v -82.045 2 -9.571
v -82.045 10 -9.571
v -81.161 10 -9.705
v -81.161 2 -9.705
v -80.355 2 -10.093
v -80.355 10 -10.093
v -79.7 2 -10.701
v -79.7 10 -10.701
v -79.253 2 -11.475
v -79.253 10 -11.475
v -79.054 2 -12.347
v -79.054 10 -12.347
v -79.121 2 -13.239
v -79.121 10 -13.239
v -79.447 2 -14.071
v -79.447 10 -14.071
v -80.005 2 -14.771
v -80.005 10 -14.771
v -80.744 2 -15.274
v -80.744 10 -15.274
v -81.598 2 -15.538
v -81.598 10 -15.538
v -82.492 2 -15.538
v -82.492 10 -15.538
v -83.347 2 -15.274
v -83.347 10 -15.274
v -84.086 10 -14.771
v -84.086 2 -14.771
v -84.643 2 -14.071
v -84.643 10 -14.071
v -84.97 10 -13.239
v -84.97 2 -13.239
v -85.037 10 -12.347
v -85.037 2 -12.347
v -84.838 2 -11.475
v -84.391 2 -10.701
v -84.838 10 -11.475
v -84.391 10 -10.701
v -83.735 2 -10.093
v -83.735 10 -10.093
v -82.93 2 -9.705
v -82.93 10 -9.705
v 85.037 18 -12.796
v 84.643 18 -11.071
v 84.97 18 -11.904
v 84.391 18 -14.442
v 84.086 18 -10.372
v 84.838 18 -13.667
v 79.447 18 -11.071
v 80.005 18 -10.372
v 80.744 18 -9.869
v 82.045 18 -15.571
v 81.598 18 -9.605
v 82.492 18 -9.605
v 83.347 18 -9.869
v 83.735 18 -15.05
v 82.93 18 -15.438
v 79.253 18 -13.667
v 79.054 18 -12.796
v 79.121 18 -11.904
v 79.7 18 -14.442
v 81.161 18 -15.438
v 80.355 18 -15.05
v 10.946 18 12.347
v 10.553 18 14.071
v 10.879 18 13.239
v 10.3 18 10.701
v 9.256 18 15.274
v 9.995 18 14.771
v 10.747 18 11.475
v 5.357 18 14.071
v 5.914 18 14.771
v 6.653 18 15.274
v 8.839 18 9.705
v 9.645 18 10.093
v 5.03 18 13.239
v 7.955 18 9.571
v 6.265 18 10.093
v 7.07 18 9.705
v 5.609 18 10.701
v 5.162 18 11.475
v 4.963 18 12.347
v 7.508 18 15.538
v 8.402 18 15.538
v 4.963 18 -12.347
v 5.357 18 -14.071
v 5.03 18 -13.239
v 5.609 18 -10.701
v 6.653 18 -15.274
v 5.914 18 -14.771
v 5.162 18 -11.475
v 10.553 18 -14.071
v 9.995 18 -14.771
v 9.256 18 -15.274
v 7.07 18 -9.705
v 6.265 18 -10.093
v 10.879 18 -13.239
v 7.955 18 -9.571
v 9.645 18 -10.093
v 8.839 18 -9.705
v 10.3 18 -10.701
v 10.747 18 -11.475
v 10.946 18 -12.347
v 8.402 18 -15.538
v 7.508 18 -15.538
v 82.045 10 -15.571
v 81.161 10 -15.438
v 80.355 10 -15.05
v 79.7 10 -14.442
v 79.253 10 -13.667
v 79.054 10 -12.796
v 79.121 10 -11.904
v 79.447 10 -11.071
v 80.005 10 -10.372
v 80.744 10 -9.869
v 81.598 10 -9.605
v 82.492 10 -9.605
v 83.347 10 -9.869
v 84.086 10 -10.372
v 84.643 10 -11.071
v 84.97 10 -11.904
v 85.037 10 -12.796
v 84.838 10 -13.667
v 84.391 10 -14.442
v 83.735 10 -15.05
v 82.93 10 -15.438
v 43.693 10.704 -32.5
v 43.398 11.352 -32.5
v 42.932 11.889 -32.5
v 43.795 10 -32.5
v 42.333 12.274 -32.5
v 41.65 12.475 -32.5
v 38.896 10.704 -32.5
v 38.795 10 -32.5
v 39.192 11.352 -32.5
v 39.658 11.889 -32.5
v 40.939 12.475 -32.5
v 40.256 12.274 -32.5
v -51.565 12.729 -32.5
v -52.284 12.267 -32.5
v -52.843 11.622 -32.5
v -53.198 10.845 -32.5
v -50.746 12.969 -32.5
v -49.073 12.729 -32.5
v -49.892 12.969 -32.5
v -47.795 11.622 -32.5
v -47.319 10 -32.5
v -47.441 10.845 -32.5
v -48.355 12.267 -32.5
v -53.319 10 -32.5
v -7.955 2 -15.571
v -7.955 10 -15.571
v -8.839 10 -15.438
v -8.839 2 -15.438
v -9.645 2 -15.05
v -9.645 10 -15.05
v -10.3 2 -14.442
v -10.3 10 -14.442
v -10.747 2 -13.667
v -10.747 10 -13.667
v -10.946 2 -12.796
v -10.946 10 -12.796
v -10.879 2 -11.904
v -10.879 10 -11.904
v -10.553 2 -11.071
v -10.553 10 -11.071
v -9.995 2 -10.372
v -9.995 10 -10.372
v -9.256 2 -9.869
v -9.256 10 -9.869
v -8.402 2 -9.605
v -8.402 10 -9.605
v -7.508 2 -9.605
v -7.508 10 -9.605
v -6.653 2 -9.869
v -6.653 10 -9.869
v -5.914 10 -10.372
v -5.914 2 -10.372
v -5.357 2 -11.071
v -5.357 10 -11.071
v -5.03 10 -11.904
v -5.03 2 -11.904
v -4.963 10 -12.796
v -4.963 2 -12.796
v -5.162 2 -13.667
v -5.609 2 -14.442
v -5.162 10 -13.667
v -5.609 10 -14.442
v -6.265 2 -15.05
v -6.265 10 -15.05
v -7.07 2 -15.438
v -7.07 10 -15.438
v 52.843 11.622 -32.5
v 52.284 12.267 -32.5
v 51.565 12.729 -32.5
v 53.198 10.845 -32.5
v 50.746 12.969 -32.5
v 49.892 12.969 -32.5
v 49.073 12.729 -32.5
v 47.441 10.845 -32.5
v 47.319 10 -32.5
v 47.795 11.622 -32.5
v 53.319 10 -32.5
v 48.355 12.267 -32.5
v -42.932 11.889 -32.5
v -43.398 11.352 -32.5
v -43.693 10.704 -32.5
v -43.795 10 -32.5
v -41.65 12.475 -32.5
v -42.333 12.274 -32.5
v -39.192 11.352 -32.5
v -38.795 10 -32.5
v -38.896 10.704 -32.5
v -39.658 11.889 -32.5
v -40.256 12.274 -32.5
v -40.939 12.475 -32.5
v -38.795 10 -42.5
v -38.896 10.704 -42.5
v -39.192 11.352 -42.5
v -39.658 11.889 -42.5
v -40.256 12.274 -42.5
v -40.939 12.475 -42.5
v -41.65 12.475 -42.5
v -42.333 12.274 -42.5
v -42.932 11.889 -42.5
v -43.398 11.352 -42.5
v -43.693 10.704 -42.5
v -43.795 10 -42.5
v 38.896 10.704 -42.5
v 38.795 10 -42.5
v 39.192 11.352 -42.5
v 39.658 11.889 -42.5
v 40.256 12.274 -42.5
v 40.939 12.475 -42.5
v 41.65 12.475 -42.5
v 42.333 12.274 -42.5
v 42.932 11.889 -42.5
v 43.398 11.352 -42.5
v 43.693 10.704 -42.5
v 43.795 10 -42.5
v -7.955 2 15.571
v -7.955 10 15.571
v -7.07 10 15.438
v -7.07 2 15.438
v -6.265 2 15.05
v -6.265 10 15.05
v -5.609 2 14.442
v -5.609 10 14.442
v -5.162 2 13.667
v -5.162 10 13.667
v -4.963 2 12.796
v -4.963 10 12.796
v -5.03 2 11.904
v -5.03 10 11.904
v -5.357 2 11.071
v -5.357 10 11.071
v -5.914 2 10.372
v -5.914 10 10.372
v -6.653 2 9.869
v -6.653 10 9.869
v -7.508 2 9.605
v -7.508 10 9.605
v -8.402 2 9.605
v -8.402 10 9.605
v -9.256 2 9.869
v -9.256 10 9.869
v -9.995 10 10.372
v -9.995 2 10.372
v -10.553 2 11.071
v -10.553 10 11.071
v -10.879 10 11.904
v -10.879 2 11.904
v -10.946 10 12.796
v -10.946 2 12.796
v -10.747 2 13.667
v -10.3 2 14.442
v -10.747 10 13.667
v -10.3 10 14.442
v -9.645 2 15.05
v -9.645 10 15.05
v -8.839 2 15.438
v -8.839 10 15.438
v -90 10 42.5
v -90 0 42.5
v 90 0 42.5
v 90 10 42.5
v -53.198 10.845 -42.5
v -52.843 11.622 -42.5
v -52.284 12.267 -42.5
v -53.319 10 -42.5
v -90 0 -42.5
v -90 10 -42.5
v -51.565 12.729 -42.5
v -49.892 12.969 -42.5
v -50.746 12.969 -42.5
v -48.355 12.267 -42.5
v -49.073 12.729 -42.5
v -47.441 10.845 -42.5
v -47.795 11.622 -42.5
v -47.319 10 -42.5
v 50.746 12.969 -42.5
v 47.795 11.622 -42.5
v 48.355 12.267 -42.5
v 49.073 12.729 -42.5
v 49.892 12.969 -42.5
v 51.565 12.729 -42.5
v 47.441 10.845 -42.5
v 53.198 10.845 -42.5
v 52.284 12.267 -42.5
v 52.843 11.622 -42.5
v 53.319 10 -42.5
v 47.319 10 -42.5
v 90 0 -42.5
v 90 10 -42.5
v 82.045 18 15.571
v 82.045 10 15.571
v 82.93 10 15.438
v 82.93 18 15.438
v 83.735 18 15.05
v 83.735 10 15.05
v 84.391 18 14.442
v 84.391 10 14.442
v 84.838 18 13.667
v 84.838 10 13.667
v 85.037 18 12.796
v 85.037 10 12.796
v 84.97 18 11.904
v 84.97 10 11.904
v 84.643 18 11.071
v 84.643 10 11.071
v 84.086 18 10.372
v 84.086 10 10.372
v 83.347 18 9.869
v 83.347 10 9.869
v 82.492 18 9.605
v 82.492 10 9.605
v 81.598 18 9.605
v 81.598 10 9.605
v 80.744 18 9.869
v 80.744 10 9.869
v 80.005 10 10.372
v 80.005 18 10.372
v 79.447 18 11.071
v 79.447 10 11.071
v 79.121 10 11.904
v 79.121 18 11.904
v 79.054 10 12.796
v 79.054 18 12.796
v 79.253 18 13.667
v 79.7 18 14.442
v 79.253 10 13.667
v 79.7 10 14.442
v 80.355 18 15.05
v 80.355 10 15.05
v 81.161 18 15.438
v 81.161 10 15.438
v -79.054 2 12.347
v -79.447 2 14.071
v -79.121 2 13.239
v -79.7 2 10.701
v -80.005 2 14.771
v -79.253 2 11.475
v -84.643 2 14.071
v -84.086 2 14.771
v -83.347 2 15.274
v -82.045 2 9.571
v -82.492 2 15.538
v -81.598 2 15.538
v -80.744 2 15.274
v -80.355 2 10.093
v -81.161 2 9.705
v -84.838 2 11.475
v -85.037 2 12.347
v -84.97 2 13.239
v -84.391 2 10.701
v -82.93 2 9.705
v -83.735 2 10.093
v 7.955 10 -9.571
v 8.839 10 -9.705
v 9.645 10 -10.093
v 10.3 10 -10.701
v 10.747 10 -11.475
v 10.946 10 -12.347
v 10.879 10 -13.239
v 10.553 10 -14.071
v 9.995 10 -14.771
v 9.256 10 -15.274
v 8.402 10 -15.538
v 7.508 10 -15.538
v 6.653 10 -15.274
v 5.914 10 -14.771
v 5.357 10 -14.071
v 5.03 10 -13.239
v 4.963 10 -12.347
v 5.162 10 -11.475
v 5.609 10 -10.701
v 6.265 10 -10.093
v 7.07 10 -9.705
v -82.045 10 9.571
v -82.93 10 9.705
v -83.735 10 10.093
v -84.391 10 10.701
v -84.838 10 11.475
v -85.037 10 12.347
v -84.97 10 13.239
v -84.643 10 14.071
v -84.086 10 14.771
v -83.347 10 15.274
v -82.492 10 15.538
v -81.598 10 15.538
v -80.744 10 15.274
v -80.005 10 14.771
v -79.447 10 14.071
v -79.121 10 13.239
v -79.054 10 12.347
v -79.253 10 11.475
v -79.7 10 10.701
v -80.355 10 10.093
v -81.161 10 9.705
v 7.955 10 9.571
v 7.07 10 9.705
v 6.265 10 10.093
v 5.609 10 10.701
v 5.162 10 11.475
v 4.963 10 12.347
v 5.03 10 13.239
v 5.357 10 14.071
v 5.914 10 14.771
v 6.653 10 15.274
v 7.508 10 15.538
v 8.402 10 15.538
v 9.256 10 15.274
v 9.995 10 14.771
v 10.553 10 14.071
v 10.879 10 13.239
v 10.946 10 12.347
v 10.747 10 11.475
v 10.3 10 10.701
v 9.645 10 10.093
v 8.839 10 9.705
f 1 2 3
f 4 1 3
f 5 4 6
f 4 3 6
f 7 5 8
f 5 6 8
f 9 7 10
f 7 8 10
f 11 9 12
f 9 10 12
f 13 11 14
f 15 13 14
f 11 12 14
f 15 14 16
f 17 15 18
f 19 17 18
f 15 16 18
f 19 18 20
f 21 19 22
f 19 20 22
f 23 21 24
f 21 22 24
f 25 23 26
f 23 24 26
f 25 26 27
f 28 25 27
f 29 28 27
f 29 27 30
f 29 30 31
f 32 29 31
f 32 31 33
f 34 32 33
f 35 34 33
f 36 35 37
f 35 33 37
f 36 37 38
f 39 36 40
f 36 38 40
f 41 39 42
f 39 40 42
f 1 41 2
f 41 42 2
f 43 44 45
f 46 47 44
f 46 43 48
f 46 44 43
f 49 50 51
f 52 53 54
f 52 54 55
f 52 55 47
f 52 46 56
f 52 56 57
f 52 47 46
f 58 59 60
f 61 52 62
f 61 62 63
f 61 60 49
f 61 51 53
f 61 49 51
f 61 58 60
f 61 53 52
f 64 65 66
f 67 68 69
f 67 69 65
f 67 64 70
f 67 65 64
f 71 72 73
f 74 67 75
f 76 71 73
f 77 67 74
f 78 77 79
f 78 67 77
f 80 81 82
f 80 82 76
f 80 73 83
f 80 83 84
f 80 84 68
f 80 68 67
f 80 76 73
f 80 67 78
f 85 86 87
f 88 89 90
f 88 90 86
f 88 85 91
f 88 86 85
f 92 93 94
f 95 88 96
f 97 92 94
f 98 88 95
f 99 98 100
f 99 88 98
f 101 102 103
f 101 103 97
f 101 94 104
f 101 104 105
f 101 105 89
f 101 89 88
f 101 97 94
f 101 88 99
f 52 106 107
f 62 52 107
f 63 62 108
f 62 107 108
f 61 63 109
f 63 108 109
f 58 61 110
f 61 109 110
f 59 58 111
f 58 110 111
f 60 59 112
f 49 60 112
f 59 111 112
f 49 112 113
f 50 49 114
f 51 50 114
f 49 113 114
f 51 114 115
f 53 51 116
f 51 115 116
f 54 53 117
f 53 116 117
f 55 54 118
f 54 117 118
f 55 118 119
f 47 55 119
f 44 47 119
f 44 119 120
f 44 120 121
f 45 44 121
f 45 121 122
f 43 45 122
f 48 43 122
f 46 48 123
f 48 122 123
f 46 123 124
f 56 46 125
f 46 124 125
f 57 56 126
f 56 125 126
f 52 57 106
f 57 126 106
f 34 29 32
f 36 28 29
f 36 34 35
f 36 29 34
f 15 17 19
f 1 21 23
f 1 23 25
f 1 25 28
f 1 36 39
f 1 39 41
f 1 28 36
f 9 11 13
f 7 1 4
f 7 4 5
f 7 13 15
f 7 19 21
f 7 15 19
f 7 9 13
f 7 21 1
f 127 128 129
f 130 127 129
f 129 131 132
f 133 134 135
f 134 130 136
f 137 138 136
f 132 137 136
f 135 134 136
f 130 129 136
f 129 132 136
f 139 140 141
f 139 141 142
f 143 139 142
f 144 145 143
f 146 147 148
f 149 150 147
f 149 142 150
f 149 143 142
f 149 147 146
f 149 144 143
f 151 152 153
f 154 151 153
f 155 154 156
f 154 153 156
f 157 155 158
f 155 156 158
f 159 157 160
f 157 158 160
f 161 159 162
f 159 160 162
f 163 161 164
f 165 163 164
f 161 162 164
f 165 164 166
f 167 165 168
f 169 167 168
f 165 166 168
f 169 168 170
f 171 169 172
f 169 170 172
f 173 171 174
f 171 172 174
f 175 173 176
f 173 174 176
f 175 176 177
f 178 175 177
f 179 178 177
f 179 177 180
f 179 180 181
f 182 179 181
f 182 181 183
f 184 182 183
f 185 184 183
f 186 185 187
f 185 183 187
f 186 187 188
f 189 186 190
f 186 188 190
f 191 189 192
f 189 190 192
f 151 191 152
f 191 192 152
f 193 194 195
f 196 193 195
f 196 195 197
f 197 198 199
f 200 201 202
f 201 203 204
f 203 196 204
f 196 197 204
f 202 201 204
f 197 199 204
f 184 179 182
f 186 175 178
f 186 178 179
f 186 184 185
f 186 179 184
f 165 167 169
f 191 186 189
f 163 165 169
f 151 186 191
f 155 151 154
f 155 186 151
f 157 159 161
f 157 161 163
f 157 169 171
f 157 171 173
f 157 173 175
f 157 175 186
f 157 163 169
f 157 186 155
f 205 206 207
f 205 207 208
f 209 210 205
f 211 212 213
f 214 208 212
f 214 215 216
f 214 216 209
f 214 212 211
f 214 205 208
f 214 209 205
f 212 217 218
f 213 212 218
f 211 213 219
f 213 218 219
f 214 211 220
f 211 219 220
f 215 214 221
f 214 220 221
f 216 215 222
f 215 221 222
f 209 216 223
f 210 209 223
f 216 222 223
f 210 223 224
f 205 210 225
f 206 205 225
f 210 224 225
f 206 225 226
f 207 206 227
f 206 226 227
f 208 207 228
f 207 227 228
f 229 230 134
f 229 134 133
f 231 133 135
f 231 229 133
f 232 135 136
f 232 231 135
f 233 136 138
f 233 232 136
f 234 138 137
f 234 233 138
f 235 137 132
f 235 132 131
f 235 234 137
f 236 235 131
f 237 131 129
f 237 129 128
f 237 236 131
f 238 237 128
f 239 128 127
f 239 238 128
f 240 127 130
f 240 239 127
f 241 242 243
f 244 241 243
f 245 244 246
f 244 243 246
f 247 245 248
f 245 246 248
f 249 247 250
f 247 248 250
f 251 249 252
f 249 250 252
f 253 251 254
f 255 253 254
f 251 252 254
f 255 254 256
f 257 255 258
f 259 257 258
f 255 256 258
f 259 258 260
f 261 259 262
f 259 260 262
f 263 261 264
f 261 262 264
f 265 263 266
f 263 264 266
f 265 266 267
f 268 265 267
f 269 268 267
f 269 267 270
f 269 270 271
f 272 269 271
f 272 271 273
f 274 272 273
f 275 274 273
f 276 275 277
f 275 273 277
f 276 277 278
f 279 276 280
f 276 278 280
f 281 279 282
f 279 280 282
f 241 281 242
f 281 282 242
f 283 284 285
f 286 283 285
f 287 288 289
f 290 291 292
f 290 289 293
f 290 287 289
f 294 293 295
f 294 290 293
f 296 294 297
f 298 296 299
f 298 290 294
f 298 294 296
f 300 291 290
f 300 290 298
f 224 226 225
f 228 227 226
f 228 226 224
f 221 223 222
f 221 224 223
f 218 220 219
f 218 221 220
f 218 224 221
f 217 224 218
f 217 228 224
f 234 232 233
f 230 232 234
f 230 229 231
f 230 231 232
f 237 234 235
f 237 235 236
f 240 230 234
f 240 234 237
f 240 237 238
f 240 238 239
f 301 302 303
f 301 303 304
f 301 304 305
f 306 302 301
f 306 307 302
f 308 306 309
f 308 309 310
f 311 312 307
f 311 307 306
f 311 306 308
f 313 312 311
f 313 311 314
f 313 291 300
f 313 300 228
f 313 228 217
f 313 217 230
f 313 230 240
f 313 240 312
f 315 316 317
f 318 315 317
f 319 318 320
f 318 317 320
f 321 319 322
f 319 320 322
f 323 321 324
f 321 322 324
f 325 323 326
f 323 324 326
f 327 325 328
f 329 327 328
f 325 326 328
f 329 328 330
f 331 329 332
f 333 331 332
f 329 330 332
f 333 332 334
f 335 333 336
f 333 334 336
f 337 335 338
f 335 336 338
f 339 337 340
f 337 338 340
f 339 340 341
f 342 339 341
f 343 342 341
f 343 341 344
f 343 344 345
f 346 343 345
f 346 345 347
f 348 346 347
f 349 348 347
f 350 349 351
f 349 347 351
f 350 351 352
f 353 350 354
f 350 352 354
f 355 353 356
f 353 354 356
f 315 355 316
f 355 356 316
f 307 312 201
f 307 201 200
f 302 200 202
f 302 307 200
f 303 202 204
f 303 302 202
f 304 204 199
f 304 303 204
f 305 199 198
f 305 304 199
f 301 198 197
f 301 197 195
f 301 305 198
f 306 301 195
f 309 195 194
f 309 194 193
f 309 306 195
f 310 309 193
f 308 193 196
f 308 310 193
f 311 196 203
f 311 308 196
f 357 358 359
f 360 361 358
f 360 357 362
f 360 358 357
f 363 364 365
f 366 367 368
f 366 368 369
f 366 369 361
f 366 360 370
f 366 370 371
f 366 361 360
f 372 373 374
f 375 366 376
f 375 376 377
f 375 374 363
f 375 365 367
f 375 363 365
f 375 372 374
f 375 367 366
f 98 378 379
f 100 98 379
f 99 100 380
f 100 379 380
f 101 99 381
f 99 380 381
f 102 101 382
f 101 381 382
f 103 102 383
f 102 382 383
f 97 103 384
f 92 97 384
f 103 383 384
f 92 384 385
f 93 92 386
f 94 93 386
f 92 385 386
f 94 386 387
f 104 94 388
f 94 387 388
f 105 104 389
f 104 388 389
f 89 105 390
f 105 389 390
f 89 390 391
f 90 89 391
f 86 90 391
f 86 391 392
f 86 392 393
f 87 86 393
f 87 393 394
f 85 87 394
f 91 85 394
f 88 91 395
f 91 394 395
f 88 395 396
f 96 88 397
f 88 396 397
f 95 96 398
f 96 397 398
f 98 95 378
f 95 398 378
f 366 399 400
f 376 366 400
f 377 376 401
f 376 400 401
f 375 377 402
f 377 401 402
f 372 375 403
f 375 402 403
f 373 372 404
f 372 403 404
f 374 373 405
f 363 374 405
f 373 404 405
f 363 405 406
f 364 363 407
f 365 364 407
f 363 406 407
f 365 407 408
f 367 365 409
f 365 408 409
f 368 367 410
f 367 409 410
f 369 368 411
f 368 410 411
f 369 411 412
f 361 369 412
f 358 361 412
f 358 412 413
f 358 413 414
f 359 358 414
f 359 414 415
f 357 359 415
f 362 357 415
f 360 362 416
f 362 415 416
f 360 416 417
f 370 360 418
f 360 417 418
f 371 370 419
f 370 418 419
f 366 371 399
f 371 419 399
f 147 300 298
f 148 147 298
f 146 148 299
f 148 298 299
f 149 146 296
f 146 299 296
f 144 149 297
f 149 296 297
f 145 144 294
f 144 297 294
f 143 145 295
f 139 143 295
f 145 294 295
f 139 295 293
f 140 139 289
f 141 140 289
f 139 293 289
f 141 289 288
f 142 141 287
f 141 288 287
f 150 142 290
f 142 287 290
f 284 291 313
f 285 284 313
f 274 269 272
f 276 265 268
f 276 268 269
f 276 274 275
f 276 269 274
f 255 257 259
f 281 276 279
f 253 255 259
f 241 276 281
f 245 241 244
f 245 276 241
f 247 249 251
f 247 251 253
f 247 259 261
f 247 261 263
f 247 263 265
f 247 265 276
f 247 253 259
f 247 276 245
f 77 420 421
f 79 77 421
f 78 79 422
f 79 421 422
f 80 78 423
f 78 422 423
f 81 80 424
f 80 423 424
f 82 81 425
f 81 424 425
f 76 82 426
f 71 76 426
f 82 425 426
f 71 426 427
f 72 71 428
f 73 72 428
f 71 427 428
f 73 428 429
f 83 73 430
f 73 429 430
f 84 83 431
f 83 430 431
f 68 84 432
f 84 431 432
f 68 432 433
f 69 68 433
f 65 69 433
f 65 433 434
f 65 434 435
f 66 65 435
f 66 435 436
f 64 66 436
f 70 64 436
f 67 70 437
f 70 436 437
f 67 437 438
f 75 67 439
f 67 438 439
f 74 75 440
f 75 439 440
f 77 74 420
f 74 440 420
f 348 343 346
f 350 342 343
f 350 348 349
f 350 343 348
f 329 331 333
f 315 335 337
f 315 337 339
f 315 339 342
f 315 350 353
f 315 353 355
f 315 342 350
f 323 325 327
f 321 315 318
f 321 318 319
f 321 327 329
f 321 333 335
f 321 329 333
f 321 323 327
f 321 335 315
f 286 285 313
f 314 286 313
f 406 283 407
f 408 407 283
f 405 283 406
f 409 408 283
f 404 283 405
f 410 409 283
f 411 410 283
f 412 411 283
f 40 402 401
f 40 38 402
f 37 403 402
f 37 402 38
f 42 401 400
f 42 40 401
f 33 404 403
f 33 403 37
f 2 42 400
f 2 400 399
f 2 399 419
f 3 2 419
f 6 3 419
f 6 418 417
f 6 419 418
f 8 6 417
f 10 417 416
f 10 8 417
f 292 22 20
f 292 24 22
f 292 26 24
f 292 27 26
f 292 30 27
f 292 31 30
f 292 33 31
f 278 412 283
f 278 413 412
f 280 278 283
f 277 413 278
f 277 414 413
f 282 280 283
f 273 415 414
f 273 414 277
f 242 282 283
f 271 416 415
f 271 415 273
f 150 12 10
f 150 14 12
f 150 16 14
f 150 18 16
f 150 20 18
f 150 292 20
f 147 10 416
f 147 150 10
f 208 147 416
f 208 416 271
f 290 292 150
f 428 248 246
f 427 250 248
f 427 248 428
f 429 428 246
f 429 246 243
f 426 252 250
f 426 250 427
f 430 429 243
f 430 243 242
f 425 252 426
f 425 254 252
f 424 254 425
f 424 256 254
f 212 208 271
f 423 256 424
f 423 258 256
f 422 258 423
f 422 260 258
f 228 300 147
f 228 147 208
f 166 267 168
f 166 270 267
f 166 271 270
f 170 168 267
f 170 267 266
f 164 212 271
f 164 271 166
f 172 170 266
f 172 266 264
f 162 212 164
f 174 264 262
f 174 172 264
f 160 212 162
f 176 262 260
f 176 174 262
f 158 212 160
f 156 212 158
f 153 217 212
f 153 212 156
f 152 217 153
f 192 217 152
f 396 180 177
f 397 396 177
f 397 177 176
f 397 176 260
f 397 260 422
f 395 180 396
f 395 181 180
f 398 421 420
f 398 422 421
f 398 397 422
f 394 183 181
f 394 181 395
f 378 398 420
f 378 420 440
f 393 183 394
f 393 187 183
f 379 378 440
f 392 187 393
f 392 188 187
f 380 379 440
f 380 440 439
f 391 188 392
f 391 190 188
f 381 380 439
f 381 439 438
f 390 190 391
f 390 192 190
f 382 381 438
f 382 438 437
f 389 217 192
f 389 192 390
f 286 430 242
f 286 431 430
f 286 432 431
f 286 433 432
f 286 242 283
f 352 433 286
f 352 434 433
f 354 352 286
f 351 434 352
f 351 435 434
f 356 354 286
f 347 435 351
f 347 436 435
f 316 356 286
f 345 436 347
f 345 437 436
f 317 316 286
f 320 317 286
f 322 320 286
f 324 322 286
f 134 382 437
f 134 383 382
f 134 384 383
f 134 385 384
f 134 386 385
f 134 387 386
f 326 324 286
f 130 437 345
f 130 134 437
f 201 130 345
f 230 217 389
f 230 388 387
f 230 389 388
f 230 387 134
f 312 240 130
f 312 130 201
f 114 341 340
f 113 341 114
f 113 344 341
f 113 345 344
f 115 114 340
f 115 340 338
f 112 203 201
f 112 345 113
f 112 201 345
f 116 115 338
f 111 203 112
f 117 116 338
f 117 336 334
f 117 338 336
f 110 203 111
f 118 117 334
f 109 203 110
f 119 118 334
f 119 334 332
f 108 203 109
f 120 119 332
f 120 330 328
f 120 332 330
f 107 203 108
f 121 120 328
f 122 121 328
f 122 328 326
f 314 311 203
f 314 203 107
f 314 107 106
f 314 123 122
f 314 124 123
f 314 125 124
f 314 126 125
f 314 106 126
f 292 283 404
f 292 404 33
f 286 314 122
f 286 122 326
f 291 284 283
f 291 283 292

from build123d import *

# Parameters (mm, degrees)
SCHIZZO1_W                   = 180
SCHIZZO1_H                   = 85
ESTRUSIONE_ESTRUSIONE1_DEPTH = 10
SCHIZZO5_R                   = 3
ESTRUSIONE_ESTRUSIONE3_DEPTH = 8
SCHIZZO5_3_R                 = 3
TAGLIO_ESTRUSIONE1_DEPTH     = 8
ESTRUSIONE_ESTRUSIONE4_DEPTH = 10


with BuildPart() as part:
    # Schizzo1 → Estrusione-Estrusione1 (new body)
    with BuildSketch(Plane(origin=(0, 0, 0), x_dir=(1, 0, 0), z_dir=(0, 1, 0))):
        Rectangle(SCHIZZO1_W, SCHIZZO1_H)
    extrude(amount=ESTRUSIONE_ESTRUSIONE1_DEPTH)

    # Schizzo5 → Estrusione-Estrusione3 (add)
    with BuildSketch(Plane(origin=(0, 10, 0), x_dir=(1, 0, 0), z_dir=(0, 1, 0))):
        with Locations((82.045349051, -12.571464774)):
            Circle(SCHIZZO5_R)
        with Locations((82.045349051, 12.571464774)):
            Circle(SCHIZZO5_R)
        with Locations((7.954650949, -12.571464774)):
            Circle(SCHIZZO5_R)
        with Locations((7.954650949, 12.571464774)):
            Circle(SCHIZZO5_R)
    extrude(amount=ESTRUSIONE_ESTRUSIONE3_DEPTH)

    # Schizzo5<3> → Taglio-Estrusione1 (cut)
    with BuildSketch(Plane(origin=(0, 10, 0), x_dir=(1, 0, 0), z_dir=(0, 1, 0))):
        with Locations((-82.045349051, 12.571464774)):
            Circle(SCHIZZO5_3_R)
        with Locations((-82.045349051, -12.571464774)):
            Circle(SCHIZZO5_3_R)
        with Locations((-7.954650949, -12.571464774)):
            Circle(SCHIZZO5_3_R)
        with Locations((-7.954650949, 12.571464774)):
            Circle(SCHIZZO5_3_R)
    extrude(amount=-TAGLIO_ESTRUSIONE1_DEPTH, mode=Mode.SUBTRACT)

    # Schizzo6 → Estrusione-Estrusione4 (add)
    with BuildSketch(Plane(origin=(0, 0, -42.5), x_dir=(-1, 0, 0), z_dir=(0, 0, -1))):
        with BuildLine():
            Line((-53.319235265, 10), (-47.319235265, 10))
            ThreePointArc((-47.319235265, 10), (-50.319235265, 13), (-53.319235265, 10))
        make_face()
        with BuildLine():
            Line((-43.794702793, 10), (-38.794702793, 10))
            ThreePointArc((-38.794702793, 10), (-41.294702793, 12.5), (-43.794702793, 10))
        make_face()
        with BuildLine():
            Line((43.794702793, 10), (38.794702793, 10))
            ThreePointArc((38.794702793, 10), (41.294702793, 12.5), (43.794702793, 10))
        make_face()
        with BuildLine():
            Line((53.319235265, 10), (47.319235265, 10))
            ThreePointArc((47.319235265, 10), (50.319235265, 13), (53.319235265, 10))
        make_face()
    extrude(amount=-ESTRUSIONE_ESTRUSIONE4_DEPTH)


solid = part.part
